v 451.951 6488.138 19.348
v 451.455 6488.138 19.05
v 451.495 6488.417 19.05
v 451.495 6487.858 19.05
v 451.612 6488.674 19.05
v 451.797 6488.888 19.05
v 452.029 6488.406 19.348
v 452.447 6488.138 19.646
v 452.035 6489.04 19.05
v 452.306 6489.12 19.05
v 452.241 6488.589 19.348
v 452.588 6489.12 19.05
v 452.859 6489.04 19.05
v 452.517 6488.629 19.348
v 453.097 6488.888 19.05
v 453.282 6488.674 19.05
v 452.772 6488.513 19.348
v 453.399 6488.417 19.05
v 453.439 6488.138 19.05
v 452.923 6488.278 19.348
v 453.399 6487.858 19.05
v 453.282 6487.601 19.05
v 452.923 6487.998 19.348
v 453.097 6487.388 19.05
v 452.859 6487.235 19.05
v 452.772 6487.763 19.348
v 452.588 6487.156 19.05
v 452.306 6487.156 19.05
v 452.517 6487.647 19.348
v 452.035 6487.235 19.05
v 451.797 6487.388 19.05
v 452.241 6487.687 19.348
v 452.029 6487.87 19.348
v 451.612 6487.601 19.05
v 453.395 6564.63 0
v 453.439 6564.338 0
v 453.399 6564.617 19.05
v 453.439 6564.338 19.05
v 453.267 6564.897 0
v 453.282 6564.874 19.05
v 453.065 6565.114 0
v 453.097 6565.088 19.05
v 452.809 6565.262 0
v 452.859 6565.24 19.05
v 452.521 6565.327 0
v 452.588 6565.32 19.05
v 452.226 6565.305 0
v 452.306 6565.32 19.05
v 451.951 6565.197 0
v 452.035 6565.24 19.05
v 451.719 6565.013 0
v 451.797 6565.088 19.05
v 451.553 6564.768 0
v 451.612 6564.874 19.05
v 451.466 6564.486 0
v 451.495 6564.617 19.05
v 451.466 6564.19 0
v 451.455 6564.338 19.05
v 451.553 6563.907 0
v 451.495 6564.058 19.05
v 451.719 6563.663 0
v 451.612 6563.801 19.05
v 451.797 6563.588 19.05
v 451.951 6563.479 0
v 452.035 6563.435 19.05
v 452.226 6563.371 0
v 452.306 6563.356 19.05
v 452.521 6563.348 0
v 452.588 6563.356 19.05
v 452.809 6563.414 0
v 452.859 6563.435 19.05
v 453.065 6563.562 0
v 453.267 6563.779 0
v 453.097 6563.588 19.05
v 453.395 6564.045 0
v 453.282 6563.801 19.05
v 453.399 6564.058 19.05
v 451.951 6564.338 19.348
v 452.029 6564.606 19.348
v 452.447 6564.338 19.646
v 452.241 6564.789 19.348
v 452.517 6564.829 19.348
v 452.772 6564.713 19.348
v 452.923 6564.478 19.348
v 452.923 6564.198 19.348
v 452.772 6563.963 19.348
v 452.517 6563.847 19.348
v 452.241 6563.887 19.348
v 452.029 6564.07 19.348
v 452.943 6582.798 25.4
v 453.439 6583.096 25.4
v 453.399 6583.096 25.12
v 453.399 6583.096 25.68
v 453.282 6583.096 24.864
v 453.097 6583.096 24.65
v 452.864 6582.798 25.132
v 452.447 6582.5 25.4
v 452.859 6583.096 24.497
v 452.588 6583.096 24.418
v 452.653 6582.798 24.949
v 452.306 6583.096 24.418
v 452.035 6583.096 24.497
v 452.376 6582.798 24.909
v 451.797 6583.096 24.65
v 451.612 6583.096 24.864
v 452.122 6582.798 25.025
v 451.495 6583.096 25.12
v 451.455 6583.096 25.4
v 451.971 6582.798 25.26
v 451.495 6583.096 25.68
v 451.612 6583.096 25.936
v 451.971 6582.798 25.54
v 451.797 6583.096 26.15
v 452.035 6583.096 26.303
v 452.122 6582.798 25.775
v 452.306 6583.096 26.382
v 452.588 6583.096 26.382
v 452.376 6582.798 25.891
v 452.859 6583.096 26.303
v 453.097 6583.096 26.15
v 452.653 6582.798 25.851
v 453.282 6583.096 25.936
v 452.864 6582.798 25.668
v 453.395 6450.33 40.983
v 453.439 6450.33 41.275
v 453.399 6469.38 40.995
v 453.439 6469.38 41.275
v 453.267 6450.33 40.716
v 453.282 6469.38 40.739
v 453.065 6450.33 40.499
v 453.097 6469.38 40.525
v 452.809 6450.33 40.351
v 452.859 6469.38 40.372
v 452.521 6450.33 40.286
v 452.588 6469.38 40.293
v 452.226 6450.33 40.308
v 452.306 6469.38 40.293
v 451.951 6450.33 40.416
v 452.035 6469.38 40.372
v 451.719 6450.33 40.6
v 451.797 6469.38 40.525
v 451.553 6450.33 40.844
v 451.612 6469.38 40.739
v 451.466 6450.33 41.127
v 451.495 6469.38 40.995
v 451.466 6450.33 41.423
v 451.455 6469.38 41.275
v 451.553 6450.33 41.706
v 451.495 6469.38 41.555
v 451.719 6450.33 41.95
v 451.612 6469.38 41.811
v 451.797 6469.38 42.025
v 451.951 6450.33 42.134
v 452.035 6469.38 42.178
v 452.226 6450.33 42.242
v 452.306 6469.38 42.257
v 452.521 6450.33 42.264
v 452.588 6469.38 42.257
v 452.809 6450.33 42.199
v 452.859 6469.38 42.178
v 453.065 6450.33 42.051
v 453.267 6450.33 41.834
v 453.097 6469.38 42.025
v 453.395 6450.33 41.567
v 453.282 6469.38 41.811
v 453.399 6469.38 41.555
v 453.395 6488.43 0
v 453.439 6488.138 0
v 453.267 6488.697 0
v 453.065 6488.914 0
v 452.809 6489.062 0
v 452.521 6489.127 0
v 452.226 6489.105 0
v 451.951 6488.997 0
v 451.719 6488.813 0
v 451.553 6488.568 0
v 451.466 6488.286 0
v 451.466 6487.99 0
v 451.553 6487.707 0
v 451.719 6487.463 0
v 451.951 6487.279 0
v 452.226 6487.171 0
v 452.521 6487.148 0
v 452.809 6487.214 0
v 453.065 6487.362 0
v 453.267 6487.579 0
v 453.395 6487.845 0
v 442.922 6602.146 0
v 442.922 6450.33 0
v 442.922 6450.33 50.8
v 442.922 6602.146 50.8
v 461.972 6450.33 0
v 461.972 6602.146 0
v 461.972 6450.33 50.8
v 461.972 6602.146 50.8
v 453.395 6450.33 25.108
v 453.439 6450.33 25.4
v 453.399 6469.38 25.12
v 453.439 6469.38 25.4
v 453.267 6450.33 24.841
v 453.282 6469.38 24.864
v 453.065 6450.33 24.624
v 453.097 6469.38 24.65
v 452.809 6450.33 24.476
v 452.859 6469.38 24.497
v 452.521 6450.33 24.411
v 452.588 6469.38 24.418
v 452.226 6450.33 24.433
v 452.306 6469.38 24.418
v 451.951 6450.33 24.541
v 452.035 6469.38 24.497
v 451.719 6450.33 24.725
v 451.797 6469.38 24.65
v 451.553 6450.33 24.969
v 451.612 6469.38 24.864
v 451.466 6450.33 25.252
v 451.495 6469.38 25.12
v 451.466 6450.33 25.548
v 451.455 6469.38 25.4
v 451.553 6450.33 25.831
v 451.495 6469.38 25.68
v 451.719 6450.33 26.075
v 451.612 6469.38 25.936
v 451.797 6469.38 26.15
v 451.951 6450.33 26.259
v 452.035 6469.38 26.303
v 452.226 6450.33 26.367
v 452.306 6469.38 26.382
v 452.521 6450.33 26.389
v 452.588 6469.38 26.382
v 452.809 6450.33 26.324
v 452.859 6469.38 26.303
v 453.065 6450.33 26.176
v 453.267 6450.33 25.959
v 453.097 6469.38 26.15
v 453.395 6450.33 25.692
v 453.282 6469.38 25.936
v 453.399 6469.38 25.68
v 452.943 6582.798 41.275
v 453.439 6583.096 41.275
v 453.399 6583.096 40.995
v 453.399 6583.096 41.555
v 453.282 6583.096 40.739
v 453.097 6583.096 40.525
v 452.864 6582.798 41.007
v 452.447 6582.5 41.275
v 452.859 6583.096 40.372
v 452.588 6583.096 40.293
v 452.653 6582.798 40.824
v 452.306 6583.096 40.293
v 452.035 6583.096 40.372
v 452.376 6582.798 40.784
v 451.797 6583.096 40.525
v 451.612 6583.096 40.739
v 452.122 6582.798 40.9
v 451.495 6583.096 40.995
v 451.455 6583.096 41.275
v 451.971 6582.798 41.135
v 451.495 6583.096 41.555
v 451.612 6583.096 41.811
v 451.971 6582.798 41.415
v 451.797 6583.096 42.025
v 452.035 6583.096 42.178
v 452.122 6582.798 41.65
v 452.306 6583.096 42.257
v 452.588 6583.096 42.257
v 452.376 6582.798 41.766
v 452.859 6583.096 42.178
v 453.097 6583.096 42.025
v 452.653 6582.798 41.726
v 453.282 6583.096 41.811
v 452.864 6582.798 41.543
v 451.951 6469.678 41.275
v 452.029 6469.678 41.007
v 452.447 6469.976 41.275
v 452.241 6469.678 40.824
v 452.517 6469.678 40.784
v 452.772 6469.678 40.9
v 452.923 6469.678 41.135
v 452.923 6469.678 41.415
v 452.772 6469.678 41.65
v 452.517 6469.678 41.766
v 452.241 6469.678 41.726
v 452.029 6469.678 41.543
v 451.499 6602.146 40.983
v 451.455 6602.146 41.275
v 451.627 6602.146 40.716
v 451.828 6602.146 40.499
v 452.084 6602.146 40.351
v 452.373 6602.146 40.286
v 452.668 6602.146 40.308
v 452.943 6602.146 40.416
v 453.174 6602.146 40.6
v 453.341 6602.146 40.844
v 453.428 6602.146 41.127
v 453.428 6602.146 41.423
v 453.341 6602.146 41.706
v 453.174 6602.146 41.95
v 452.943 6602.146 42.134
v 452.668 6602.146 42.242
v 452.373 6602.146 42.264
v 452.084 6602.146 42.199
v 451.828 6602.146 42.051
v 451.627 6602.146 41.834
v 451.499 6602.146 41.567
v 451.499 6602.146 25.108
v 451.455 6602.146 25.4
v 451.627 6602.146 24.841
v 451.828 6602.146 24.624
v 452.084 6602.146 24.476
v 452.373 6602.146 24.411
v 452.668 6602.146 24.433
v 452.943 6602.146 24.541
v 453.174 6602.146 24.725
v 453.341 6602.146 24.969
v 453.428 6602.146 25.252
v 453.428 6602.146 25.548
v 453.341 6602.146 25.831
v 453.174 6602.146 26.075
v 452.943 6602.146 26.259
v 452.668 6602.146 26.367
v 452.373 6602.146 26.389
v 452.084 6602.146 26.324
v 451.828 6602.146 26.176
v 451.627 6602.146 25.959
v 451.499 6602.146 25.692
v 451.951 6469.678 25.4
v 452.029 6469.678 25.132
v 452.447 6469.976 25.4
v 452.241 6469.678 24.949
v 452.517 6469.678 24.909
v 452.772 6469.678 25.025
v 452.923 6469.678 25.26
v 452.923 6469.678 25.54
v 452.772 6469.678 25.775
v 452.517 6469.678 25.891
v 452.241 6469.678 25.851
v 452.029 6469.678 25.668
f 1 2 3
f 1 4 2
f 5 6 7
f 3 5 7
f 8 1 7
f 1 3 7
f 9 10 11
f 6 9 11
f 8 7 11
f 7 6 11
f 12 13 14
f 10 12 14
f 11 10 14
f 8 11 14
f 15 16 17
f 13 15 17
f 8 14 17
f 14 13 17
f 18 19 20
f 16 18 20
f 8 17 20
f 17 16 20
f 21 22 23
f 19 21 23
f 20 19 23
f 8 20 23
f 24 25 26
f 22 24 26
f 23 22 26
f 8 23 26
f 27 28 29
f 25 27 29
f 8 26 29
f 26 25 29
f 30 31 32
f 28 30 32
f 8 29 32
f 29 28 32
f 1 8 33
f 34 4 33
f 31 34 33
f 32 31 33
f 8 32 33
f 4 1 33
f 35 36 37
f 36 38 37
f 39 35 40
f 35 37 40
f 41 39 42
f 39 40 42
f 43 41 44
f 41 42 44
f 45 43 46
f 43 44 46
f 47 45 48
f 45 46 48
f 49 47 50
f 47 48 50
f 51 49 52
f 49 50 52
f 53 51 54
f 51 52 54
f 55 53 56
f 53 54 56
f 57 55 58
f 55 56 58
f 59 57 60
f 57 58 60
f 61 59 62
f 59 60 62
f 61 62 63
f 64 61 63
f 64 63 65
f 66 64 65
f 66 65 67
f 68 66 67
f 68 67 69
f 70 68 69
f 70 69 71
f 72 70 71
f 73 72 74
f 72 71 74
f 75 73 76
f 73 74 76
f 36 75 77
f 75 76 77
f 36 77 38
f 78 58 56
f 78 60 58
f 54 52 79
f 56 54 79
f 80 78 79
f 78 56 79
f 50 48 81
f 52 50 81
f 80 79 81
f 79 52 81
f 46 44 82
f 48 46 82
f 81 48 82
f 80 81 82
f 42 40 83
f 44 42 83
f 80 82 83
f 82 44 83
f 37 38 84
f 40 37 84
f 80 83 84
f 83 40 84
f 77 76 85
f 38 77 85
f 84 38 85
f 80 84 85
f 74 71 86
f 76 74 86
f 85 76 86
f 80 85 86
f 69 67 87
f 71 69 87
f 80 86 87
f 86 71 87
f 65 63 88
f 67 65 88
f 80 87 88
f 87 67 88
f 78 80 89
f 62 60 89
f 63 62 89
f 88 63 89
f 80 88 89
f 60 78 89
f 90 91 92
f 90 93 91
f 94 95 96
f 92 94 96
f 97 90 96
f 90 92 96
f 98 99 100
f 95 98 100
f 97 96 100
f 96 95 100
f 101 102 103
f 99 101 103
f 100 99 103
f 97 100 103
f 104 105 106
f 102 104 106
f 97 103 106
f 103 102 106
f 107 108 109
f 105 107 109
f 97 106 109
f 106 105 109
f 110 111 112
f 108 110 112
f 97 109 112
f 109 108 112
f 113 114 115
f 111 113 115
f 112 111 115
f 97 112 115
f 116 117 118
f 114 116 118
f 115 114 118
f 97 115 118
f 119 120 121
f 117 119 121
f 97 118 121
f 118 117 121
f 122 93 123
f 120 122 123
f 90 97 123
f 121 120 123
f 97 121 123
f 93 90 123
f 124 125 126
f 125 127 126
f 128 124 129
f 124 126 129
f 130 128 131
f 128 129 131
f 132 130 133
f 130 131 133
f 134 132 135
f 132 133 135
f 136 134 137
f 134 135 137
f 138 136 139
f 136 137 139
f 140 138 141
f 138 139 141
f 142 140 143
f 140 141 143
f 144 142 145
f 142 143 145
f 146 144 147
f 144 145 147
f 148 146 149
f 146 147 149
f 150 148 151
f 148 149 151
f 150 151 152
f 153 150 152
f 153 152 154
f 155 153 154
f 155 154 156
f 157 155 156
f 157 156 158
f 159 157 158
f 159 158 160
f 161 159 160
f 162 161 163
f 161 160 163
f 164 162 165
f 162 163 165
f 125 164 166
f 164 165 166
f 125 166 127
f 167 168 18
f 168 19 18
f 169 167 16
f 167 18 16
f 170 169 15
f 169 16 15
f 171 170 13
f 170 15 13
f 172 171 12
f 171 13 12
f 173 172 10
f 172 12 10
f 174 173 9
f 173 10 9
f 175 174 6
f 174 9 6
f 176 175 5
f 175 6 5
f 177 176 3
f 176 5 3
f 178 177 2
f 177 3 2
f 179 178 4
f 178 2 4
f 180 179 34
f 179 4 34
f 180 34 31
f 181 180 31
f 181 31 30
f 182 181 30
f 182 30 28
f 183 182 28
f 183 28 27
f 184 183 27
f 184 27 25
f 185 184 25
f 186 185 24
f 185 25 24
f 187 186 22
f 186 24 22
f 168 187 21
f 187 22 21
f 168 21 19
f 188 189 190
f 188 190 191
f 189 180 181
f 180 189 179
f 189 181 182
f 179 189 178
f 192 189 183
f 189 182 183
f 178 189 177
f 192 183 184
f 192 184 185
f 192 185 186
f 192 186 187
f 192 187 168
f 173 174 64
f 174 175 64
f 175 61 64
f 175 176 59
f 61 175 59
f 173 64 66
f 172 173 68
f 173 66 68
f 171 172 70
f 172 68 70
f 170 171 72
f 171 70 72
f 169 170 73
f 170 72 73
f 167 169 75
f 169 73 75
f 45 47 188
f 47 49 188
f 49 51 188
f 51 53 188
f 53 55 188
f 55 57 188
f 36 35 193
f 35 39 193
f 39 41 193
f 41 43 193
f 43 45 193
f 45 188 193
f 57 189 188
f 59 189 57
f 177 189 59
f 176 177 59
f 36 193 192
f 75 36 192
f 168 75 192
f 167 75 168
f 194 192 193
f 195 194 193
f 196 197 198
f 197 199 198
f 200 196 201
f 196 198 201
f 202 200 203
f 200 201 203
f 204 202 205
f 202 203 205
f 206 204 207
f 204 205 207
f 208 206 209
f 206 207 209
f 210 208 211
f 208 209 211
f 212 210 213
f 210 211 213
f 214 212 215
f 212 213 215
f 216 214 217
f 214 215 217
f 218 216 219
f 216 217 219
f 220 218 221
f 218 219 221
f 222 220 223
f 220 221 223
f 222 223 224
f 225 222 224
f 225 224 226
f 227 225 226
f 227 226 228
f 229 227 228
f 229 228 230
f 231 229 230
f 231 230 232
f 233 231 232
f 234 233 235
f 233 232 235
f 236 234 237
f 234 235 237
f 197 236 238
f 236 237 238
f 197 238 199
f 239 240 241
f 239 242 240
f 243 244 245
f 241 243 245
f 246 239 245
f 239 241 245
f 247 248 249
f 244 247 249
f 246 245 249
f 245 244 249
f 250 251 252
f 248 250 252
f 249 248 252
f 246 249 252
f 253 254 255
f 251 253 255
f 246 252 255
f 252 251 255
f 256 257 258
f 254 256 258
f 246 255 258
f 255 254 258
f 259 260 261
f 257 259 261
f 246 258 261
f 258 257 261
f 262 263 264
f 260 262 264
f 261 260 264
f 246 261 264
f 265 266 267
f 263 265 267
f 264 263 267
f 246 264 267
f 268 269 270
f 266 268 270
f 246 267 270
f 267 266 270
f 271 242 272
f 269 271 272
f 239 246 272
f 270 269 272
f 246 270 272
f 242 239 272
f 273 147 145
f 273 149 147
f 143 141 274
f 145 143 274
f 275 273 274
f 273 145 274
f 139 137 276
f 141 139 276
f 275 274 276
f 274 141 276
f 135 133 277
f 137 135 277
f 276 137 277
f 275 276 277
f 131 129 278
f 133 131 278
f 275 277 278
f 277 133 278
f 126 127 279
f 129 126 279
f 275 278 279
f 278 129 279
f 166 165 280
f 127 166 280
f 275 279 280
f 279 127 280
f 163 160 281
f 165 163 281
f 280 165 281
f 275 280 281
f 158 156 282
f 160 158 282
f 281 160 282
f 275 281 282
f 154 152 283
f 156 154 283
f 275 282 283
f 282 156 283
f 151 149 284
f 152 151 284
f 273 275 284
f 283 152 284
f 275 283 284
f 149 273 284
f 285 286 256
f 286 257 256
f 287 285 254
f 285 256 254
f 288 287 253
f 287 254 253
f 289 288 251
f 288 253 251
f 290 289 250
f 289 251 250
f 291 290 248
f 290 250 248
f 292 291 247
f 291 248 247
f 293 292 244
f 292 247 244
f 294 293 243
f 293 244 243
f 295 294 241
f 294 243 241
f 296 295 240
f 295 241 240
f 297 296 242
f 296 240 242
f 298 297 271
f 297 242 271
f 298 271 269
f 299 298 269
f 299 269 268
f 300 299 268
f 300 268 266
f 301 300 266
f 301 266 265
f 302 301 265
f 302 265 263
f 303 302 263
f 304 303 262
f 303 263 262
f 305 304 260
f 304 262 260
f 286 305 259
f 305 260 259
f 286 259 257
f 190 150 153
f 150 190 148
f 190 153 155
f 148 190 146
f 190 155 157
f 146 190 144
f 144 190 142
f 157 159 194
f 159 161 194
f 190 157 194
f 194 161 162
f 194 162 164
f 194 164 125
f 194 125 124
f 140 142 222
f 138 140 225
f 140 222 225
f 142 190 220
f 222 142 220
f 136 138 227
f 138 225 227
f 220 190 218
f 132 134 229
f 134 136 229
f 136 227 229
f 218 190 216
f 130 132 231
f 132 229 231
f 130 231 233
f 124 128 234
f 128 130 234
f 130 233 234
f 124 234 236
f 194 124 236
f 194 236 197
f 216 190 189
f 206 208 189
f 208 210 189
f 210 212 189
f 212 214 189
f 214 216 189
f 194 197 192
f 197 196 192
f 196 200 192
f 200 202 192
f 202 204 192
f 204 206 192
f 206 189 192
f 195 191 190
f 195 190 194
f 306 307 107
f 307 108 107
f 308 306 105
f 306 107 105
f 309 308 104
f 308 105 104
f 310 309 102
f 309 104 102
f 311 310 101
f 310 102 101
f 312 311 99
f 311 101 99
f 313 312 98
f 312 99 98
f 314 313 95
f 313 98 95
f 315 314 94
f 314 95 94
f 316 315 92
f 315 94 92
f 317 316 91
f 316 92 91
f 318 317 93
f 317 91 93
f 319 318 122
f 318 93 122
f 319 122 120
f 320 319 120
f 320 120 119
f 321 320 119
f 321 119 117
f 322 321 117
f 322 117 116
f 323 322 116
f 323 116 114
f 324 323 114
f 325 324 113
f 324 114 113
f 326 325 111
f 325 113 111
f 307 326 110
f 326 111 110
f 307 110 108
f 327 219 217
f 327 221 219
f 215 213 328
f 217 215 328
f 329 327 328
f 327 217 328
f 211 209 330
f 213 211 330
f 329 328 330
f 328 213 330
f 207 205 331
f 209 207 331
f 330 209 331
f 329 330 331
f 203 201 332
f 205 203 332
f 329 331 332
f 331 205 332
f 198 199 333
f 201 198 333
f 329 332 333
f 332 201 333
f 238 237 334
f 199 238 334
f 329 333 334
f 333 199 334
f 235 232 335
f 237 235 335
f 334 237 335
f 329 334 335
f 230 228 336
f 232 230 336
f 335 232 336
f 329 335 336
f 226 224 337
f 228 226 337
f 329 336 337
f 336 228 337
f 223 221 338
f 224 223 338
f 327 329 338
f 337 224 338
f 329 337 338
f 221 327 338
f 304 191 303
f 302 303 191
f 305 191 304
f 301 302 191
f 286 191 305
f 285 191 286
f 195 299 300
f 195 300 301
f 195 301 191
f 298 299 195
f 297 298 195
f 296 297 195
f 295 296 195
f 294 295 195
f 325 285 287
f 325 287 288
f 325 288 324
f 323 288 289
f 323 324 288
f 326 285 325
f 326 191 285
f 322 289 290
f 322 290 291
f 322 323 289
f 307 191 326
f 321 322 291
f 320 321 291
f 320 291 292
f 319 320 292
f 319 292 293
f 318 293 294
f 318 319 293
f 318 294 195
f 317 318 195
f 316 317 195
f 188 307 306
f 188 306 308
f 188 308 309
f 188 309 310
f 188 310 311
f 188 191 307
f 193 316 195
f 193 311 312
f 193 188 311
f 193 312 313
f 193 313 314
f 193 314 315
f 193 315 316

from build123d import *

# Parameters (mm, degrees)
SKETCH1_W                           = 19.05
SKETCH1_H                           = 151.8158
BOSS_EXTRUDE1_DEPTH                 = 50.8
F_5_64_0_07813_DIAMETER_HOLE1_D     = 1.984502
F_5_64_0_07813_DIAMETER_HOLE1_DEPTH = 38.1
F_5_64_0_07813_DIAMETER_HOLE1_TIP   = 0.59620455
F_5_64_0_07813_DIAMETER_HOLE2_D     = 1.984502
F_5_64_0_07813_DIAMETER_HOLE2_DEPTH = 38.1
F_5_64_0_07813_DIAMETER_HOLE2_TIP   = 0.59620455
F_5_64_0_07813_DIAMETER_HOLE3_D     = 1.984502
F_5_64_0_07813_DIAMETER_HOLE3_DEPTH = 19.05
F_5_64_0_07813_DIAMETER_HOLE3_TIP   = 0.59620455
F_5_64_0_07813_DIAMETER_HOLE4_D     = 1.984502
F_5_64_0_07813_DIAMETER_HOLE4_DEPTH = 19.05
F_5_64_0_07813_DIAMETER_HOLE4_TIP   = 0.59620455


with BuildPart() as part:
    # Sketch1 → Boss-Extrude1 (new body)
    with BuildSketch(Plane.XY):
        with Locations((452.446826131, 6526.2379)):
            Rectangle(SKETCH1_W, SKETCH1_H)
    extrude(amount=BOSS_EXTRUDE1_DEPTH)

    # 5/64 (0.07813) Diameter Hole1
    with Locations(Plane(origin=(5.615513709, 0, -19.05), x_dir=(-1, 0, 0), z_dir=(0, 0, -1))):
        with Locations((-481.589248274, 6993.254992531), (-386.339248274, 6993.254992531), (-291.089248274, 6993.254992531), (-295.274999999, 6965.135938475), (-295.274999999, 6812.735938475), (-295.274999999, 6660.335938474), (-285.166362357, 6631.468843414), (-475.477307398, 6631.468752771), (-485.002307398, 6660.335938474), (-485.002307398, 6812.735938474), (-485.002307398, 6965.135938474), (-478.365617646, 6611.6708), (-287.865617646, 6611.6708), (-307.975, 6564.3379), (-307.975, 6488.1379), (-284.960913066, 6440.805), (-380.210913066, 6440.805), (-475.460913066, 6440.805), (-446.831312422, 6488.1379), (-446.831312422, 6564.3379), (-472.231312422, 6396.355), (-472.231312422, 6320.155), (-472.653156211, 6275.705000839), (-377.403156211, 6275.705000839), (-282.153156211, 6275.705000839), (-282.575, 6320.155), (-282.575, 6396.355), (-435.598646187, 6221.729999816), (-435.598646187, 6145.529999816), (-450.592518112, 6091.554999951), (-460.998646187, 6091.555478285), (-460.998646187, 6056.629999944), (-460.998646187, 5980.429999944), (-460.998646187, 5945.505000042), (-282.153156211, 5945.505000042), (-368.611823093, 5945.505000042)):
            Hole(F_5_64_0_07813_DIAMETER_HOLE1_D / 2, depth=F_5_64_0_07813_DIAMETER_HOLE1_DEPTH)
            with Locations((0, 0, -(F_5_64_0_07813_DIAMETER_HOLE1_DEPTH + F_5_64_0_07813_DIAMETER_HOLE1_TIP / 2))):  # 118° drill point
                Cone(0, F_5_64_0_07813_DIAMETER_HOLE1_D / 2, F_5_64_0_07813_DIAMETER_HOLE1_TIP, mode=Mode.SUBTRACT)

    # 5/64 (0.07813) Diameter Hole2
    with Locations(Plane(origin=(144.471826131, 0, -19.05), x_dir=(-1, 0, 0), z_dir=(0, 0, -1))):
        with Locations((-481.589248274, 6993.254992531), (-386.339248274, 6993.254992531), (-291.089248274, 6993.254992531), (-295.274999999, 6965.135938475), (-295.274999999, 6812.735938475), (-295.274999999, 6660.335938474), (-285.166362357, 6631.468843414), (-475.477307398, 6631.468752771), (-485.002307398, 6660.335938474), (-485.002307398, 6812.735938474), (-485.002307398, 6965.135938474), (-478.365617646, 6611.6708), (-287.865617646, 6611.6708), (-307.975, 6564.3379), (-307.975, 6488.1379), (-284.960913066, 6440.805), (-380.210913066, 6440.805), (-475.460913066, 6440.805), (-446.831312422, 6488.1379), (-446.831312422, 6564.3379), (-472.231312422, 6396.355), (-472.231312422, 6320.155), (-472.653156211, 6275.705000839), (-377.403156211, 6275.705000839), (-282.153156211, 6275.705000839), (-282.575, 6320.155), (-282.575, 6396.355), (-435.598646187, 6221.729999816), (-435.598646187, 6145.529999816), (-450.592518112, 6091.554999951), (-460.998646187, 6091.555478285), (-460.998646187, 6056.629999944), (-460.998646187, 5980.429999944), (-460.998646187, 5945.505000042), (-282.153156211, 5945.505000042), (-368.611823093, 5945.505000042)):
            Hole(F_5_64_0_07813_DIAMETER_HOLE2_D / 2, depth=F_5_64_0_07813_DIAMETER_HOLE2_DEPTH)
            with Locations((0, 0, -(F_5_64_0_07813_DIAMETER_HOLE2_DEPTH + F_5_64_0_07813_DIAMETER_HOLE2_TIP / 2))):  # 118° drill point
                Cone(0, F_5_64_0_07813_DIAMETER_HOLE2_D / 2, F_5_64_0_07813_DIAMETER_HOLE2_TIP, mode=Mode.SUBTRACT)

    # 5/64 (0.07813) Diameter Hole3
    with Locations(Plane(origin=(0, 6602.1458, 0), x_dir=(1, 0, 0), z_dir=(0, 1, 0))):
        with Locations((452.446826131, -41.275), (452.446826131, -25.4)):
            Hole(F_5_64_0_07813_DIAMETER_HOLE3_D / 2, depth=F_5_64_0_07813_DIAMETER_HOLE3_DEPTH)
            with Locations((0, 0, -(F_5_64_0_07813_DIAMETER_HOLE3_DEPTH + F_5_64_0_07813_DIAMETER_HOLE3_TIP / 2))):  # 118° drill point
                Cone(0, F_5_64_0_07813_DIAMETER_HOLE3_D / 2, F_5_64_0_07813_DIAMETER_HOLE3_TIP, mode=Mode.SUBTRACT)

    # 5/64 (0.07813) Diameter Hole4
    with Locations(Plane(origin=(0, 6450.33, 0), x_dir=(-1, 0, 0), z_dir=(0, -1, 0))):
        with Locations((-452.446826131, -41.275), (-452.446826131, -25.4)):
            Hole(F_5_64_0_07813_DIAMETER_HOLE4_D / 2, depth=F_5_64_0_07813_DIAMETER_HOLE4_DEPTH)
            with Locations((0, 0, -(F_5_64_0_07813_DIAMETER_HOLE4_DEPTH + F_5_64_0_07813_DIAMETER_HOLE4_TIP / 2))):  # 118° drill point
                Cone(0, F_5_64_0_07813_DIAMETER_HOLE4_D / 2, F_5_64_0_07813_DIAMETER_HOLE4_TIP, mode=Mode.SUBTRACT)


solid = part.part
